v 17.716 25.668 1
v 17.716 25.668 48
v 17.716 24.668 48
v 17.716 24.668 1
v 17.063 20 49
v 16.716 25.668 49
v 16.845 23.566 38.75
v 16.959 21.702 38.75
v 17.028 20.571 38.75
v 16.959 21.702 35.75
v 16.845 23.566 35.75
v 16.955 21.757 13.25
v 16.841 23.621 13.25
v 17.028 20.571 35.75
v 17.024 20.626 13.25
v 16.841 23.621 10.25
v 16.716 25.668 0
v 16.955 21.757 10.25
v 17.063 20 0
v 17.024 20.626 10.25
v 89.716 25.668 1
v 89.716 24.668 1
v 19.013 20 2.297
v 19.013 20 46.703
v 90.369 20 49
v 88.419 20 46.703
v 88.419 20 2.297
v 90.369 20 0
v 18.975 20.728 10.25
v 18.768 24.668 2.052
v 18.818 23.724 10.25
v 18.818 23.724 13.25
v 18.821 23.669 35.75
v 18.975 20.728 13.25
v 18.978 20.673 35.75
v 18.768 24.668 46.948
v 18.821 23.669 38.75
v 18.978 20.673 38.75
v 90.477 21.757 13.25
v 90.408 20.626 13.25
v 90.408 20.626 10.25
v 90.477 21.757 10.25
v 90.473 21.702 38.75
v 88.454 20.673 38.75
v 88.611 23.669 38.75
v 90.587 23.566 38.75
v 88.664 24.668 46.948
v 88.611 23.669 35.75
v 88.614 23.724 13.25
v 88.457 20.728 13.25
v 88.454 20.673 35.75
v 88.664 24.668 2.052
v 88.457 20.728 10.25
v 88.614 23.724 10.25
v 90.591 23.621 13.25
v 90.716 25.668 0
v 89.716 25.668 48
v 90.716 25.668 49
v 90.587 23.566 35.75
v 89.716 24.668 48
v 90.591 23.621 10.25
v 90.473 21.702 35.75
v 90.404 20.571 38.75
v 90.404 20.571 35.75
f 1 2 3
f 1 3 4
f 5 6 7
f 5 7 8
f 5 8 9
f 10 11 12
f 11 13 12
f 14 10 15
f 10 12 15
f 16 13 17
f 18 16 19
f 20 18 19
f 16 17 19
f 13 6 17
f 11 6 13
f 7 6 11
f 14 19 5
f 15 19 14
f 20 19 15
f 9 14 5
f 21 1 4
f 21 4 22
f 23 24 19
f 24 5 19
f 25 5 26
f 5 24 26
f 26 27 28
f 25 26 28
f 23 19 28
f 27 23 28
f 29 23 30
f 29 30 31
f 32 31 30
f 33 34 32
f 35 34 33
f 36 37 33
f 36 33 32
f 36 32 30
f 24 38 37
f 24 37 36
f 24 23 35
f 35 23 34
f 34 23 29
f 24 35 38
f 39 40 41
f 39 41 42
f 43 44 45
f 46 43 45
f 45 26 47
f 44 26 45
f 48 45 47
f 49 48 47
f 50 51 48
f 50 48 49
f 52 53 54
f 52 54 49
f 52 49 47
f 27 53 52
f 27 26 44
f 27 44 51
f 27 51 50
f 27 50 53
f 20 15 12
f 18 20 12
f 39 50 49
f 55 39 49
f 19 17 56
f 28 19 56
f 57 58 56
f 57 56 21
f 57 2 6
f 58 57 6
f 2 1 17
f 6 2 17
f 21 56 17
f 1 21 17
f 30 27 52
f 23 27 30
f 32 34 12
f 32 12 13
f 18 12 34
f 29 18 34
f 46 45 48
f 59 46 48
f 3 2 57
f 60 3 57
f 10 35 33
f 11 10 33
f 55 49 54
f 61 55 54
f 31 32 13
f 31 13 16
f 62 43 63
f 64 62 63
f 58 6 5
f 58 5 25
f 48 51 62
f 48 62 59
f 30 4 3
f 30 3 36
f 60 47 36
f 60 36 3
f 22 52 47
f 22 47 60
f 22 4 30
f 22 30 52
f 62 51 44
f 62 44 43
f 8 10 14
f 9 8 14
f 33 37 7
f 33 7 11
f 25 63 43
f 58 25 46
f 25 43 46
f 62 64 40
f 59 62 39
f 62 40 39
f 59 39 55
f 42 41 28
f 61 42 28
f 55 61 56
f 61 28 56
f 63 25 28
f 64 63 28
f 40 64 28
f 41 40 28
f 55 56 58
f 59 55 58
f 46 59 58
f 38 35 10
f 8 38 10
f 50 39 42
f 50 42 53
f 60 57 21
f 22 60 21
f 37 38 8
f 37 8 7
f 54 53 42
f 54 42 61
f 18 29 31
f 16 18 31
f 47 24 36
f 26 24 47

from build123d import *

# Parameters (mm, degrees)
EXTRUDE_1_DEPTH          = 49
SKETCH_2_W               = 70
SKETCH_2_H               = 45
CUT_EXTRUDE_1_DEPTH      = 55.224494
CUT_EXTRUDE_1_TAPER      = 3
SKETCH_3_W               = 72
SKETCH_3_H               = 47
CUT_EXTRUDE_2_DEPTH      = 1
SKETCH_5_W               = 3
SKETCH_5_H               = 3
CUT_EXTRUDE_3_DEPTH      = 2
EXTRUDE_2_DEPTH          = 3
EXTRUDE_3_DEPTH          = 3
SKETCH_9_W               = 92.207980396
SKETCH_9_H               = 62.219536403
CUT_EXTRUDE_4_DEPTH      = 20
CUT_EXTRUDE_4_DEPTH_BACK = 32.556614873


with BuildPart() as part:
    # Sketch 1 → Extrude 1 (new body)
    with BuildSketch(Plane.XY):
        Polygon((16.715993843, 25.667879294), (20.215993843, -31.556614873), (87.215993843, -31.556614873), (90.715993843, 25.667879294), align=None)
    extrude(amount=EXTRUDE_1_DEPTH)

    # Sketch 2 → Cut-Extrude 1 (cut)
    with BuildSketch(Plane(origin=(0, 25.667879294, 0), x_dir=(1, 0, 0), z_dir=(0, 1, 0))):
        with Locations((53.715993843, -24.5)):
            Rectangle(SKETCH_2_W, SKETCH_2_H)
    extrude(amount=-CUT_EXTRUDE_1_DEPTH, taper=CUT_EXTRUDE_1_TAPER, mode=Mode.SUBTRACT)

    # Sketch 3 → Cut-Extrude 2 (cut)
    with BuildSketch(Plane(origin=(0, 25.667879294, 0), x_dir=(1, 0, 0), z_dir=(0, 1, 0))):
        with Locations((53.715993843, -24.5)):
            Rectangle(SKETCH_3_W, SKETCH_3_H)
    extrude(amount=-CUT_EXTRUDE_2_DEPTH, mode=Mode.SUBTRACT)

    # Sketch 5 → Cut-Extrude 3 (cut)
    with BuildSketch(Plane(origin=(20.006241746, 1.048482702, 0), x_dir=(0, 0, -1), z_dir=(0.998629535, 0.052335956, 0))):
        with Locations((-37.25, 21.151810576)):
            Rectangle(SKETCH_5_W, SKETCH_5_H)
        with Locations((-11.75, 21.206889344)):
            Rectangle(SKETCH_5_W, SKETCH_5_H)
    cut_extrude_3 = extrude(amount=-CUT_EXTRUDE_3_DEPTH, mode=Mode.SUBTRACT)

    # Sketch 6 → Extrude 2 (add)
    with BuildSketch(Plane.XY.offset(35.75)):
        Polygon((18.977745448, 20.673361155), (16.95854549, 21.70219492), (17.027722258, 20.57116477), align=None)
    extrude_2 = extrude(amount=EXTRUDE_2_DEPTH)

    # Sketch 7 → Extrude 3 (add)
    with BuildSketch(Plane(origin=(0, 0, 13.25), x_dir=(-1, 0, 0), z_dir=(0, 0, -1))):
        Polygon((-18.974862848, 20.728364439), (-17.024359652, 20.626142898), (-16.955165856, 21.757451456), align=None)
    extrude_3 = extrude(amount=EXTRUDE_3_DEPTH)

    # Mirror 2: Cut-Extrude 3, Extrude 2, Extrude 3 across plane
    add(cut_extrude_3.mirror(Plane(origin=(53.715993843, 0, 0), x_dir=(0, 0, 1), z_dir=(1, 0, 0))), mode=Mode.SUBTRACT)
    add(extrude_2.mirror(Plane(origin=(53.715993843, 0, 0), x_dir=(0, 0, 1), z_dir=(1, 0, 0))))
    add(extrude_3.mirror(Plane(origin=(53.715993843, 0, 0), x_dir=(0, 0, 1), z_dir=(1, 0, 0))))

    # Sketch 9 → Cut-Extrude 4 (cut, two sides)
    with BuildSketch(Plane(origin=(0, 0, 0), x_dir=(1, 0, 0), z_dir=(0, 1, 0))) as cut_extrude_4_sk:
        with Locations((56.409215525, -25.014933301)):
            Rectangle(SKETCH_9_W, SKETCH_9_H)
    extrude(amount=CUT_EXTRUDE_4_DEPTH, mode=Mode.SUBTRACT)
    extrude(cut_extrude_4_sk.sketch, amount=-CUT_EXTRUDE_4_DEPTH_BACK, mode=Mode.SUBTRACT)


solid = part.part
